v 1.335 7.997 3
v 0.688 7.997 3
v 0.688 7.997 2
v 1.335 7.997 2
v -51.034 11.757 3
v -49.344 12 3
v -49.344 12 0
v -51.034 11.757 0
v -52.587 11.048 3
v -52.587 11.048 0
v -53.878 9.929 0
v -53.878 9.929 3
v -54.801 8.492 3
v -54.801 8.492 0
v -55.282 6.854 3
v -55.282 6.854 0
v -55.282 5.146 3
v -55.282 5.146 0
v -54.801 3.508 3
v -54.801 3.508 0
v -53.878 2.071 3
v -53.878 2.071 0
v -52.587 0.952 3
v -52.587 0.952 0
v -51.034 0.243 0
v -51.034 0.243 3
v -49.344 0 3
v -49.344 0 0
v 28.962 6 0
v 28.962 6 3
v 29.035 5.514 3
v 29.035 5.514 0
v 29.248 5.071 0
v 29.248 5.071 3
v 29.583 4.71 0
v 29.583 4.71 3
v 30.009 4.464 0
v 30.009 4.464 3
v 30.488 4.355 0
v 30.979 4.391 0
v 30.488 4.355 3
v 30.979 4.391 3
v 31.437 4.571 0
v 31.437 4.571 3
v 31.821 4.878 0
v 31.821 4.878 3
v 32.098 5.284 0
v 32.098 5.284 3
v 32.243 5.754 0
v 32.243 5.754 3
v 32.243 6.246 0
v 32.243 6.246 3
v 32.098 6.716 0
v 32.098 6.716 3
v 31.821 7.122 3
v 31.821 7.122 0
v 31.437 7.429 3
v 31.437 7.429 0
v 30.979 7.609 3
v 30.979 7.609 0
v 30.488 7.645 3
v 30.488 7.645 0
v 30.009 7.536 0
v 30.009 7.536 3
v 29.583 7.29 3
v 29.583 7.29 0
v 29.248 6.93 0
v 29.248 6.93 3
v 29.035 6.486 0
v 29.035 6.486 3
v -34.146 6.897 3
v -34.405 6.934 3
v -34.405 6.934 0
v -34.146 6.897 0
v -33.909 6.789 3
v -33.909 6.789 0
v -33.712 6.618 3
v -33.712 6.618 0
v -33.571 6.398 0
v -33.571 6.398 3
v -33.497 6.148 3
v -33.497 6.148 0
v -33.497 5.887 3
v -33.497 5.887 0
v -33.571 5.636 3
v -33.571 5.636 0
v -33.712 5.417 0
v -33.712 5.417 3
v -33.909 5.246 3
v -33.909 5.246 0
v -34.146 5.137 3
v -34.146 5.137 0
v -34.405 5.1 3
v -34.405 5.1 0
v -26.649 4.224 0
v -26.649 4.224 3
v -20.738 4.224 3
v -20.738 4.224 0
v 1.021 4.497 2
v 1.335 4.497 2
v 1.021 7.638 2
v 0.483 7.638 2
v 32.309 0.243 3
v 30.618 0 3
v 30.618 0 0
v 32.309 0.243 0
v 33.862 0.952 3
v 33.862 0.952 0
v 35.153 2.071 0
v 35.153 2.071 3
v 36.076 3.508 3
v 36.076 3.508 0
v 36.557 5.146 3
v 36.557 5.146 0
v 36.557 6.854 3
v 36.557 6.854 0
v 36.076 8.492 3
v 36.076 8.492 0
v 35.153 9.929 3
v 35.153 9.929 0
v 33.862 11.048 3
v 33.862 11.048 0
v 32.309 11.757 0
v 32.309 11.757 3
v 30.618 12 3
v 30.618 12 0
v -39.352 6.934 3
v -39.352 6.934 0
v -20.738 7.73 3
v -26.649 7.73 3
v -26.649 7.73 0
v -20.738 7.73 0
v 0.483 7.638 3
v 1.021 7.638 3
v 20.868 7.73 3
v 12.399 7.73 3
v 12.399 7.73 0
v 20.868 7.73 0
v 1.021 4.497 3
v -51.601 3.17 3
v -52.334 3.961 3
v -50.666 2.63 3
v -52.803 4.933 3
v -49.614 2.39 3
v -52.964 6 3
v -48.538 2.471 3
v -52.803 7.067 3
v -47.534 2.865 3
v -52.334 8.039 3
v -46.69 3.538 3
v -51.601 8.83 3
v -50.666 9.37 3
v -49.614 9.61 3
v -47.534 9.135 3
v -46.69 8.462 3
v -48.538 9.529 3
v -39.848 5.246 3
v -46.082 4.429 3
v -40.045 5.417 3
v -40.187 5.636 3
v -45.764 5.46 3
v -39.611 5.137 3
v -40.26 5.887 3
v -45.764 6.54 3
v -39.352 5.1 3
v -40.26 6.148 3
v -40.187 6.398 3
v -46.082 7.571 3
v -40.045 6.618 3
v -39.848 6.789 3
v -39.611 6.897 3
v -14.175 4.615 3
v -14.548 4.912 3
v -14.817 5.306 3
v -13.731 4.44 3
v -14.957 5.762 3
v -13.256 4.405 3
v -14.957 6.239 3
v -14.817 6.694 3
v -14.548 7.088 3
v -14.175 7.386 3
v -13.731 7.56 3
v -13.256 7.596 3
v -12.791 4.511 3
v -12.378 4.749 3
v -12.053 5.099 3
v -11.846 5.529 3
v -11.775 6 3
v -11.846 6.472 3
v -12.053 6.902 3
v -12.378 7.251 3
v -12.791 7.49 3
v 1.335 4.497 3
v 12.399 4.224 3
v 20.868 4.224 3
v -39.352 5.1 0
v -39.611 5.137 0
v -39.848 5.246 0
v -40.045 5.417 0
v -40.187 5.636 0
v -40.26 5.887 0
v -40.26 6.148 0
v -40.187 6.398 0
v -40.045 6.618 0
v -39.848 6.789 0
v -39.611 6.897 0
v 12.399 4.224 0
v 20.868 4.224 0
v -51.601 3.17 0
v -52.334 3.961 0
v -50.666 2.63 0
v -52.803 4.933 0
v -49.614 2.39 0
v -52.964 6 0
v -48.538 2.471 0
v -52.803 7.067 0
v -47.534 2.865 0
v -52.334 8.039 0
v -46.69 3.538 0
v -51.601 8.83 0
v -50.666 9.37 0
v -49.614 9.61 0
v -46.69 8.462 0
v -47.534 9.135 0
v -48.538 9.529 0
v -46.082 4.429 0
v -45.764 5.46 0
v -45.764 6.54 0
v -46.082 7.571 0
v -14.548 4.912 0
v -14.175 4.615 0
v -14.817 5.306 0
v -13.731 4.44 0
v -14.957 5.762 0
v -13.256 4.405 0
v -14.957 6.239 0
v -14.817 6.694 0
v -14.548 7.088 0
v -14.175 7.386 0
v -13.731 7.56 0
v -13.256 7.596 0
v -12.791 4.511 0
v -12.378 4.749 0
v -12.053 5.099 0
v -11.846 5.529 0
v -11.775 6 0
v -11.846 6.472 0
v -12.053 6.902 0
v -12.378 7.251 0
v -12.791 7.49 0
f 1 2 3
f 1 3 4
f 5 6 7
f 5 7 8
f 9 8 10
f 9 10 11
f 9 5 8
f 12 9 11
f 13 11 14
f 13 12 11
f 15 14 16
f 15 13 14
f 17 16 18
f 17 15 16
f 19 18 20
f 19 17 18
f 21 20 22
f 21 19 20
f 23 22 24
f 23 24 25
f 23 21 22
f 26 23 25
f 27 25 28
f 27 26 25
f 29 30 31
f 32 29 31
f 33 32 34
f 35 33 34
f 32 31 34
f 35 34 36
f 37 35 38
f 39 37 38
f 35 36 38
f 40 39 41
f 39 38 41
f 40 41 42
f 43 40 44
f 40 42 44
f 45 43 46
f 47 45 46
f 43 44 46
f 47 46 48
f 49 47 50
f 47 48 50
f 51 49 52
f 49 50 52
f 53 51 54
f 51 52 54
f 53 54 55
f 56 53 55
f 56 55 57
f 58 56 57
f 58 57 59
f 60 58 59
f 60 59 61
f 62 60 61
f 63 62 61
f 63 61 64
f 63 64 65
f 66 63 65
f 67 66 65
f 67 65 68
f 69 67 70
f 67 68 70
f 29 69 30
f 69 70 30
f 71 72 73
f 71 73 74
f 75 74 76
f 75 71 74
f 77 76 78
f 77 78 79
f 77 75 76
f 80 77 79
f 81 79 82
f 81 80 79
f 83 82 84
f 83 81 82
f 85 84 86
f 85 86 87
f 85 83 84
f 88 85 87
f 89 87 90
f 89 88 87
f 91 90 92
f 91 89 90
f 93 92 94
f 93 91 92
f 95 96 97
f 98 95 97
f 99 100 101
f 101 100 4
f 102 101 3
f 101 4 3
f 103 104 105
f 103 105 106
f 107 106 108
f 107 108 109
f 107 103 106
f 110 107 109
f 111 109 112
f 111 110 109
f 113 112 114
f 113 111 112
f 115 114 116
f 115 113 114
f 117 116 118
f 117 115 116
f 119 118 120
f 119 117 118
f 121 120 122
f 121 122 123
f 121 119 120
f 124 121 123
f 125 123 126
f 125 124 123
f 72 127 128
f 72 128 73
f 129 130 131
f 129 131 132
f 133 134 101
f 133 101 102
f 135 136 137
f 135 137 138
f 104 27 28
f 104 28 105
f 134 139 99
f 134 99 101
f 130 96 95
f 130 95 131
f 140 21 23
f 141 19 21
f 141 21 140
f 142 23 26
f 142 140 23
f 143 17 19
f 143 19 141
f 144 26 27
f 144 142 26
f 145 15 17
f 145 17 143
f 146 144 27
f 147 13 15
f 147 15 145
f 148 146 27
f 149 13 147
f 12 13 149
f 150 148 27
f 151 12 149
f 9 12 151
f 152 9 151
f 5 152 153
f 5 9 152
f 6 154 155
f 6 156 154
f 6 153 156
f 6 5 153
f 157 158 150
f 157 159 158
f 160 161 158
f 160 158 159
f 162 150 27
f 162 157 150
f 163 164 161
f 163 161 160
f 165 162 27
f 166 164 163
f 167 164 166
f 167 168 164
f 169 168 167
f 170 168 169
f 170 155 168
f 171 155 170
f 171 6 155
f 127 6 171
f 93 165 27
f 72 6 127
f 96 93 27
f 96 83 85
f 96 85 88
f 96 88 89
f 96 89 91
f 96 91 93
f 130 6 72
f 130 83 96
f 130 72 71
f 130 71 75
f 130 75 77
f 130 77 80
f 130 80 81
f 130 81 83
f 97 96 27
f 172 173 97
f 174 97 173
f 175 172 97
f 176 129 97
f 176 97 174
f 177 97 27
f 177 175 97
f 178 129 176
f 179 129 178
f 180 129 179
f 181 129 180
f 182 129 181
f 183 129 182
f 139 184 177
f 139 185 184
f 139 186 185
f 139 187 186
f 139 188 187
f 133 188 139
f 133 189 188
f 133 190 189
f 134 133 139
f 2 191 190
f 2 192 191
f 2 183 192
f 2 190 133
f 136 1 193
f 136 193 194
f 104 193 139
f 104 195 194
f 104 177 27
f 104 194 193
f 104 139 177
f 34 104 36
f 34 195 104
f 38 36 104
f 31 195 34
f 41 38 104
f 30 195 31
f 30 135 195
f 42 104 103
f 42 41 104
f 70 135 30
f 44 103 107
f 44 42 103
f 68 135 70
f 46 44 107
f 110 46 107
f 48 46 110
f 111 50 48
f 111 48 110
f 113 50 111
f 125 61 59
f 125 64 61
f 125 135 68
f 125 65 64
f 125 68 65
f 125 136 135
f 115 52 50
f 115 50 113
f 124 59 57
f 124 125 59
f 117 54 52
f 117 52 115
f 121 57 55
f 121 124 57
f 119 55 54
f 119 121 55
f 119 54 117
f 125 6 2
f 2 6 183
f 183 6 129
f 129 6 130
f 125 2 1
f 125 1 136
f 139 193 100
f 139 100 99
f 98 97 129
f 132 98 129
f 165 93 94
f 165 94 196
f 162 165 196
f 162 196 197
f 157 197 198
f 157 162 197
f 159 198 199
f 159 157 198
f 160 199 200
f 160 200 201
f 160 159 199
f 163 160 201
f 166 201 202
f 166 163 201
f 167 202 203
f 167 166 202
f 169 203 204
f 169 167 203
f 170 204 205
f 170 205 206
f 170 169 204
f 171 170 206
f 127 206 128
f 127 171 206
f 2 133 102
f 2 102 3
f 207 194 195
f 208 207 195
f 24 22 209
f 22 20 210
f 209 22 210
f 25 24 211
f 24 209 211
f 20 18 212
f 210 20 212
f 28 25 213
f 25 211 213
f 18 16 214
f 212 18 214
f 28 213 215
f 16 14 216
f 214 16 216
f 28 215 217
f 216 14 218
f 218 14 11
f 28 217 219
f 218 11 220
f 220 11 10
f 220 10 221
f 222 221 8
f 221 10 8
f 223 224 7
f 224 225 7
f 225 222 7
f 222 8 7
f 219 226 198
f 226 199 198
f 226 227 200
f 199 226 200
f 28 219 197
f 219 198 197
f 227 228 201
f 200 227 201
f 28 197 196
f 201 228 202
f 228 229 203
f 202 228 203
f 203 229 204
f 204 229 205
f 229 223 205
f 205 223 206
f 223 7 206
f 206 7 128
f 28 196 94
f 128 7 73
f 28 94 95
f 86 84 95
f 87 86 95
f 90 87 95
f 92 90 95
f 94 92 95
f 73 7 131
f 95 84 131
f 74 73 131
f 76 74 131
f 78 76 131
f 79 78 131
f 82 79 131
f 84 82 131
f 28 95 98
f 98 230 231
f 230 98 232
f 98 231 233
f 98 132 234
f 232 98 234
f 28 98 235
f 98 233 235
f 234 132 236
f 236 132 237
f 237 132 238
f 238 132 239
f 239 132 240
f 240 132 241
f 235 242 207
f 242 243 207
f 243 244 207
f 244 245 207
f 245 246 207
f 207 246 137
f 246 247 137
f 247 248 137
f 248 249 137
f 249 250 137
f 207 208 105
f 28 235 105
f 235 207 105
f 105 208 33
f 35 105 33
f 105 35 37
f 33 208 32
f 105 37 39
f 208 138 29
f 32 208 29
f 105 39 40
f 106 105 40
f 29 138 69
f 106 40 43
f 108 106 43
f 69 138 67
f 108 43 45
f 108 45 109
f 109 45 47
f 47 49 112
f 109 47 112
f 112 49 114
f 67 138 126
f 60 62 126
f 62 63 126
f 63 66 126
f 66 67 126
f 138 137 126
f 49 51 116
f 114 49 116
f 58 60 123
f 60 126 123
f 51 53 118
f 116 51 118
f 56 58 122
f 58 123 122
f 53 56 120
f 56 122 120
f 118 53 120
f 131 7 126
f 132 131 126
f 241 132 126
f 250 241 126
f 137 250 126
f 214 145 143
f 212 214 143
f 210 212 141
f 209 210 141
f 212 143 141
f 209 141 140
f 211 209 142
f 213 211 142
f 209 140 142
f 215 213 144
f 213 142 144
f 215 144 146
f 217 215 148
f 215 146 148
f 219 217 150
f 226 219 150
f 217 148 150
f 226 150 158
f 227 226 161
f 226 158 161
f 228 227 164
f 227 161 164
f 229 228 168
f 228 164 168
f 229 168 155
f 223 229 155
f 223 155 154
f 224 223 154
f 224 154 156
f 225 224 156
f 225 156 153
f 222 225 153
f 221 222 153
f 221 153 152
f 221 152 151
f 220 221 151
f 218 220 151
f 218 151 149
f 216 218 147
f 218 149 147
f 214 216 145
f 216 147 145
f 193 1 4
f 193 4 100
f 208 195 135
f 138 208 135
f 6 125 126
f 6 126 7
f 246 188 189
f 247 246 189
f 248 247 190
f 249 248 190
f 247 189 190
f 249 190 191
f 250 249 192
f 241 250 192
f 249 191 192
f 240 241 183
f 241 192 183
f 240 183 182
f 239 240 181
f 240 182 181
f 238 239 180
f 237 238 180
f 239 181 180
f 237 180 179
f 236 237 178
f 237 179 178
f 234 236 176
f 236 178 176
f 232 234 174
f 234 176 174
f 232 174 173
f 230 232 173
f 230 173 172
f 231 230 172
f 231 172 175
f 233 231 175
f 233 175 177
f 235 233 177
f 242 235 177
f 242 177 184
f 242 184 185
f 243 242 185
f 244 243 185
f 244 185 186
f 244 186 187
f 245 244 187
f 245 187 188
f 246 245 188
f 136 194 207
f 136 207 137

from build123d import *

# Parameters (mm, degrees)
SKETCH_1_R          = 1.65
SKETCH_1_R_2        = 3.62
SKETCH_1_W          = 5.910456895
SKETCH_1_H          = 3.506249455
SKETCH_1_W_2        = 8.468810135
EXTRUDE_1_DEPTH     = 3
SKETCH_2_R          = 1.6
CUT_EXTRUDE_1_DEPTH = 57.708942736
CUT_EXTRUDE_2_DEPTH = 1


with BuildPart() as part:
    # 草图1 → 凸台-拉伸1 (new body)
    with BuildSketch(Plane.XY.offset(3)):
        with BuildLine():
            Line((30.618171933, 12), (-49.343510787, 12))
            ThreePointArc((-49.343510787, 12), (-55.343510787, 6), (-49.343510787, 0))
            Line((-49.343510787, 0), (30.618171933, 0))
            ThreePointArc((30.618171933, 0), (36.618171933, 6), (30.618171933, 12))
        make_face()
        with Locations(Location((30.611606698, 6.0001, 0), (0, 0, 180))):
            Circle(SKETCH_1_R, mode=Mode.SUBTRACT)
        with Locations(Location((-49.343510787, 6, 0), (0, 0, 180))):
            Circle(SKETCH_1_R_2, mode=Mode.SUBTRACT)
        with Locations((-23.693418044, 5.97708776)):
            Rectangle(SKETCH_1_W, SKETCH_1_H, mode=Mode.SUBTRACT)
        with Locations((16.633615742, 5.97708776)):
            Rectangle(SKETCH_1_W_2, SKETCH_1_H, mode=Mode.SUBTRACT)
        with BuildLine():
            Line((-34.404739086, 5.1001), (-39.352347519, 5.1001))
            ThreePointArc((-39.352347519, 5.1001), (-40.269423986, 6.017176468), (-39.352347519, 6.934252935))
            Line((-39.352347519, 6.934252935), (-34.404739086, 6.934252935))
            ThreePointArc((-34.404739086, 6.934252935), (-33.487662618, 6.017176468), (-34.404739086, 5.1001))
        make_face(mode=Mode.SUBTRACT)
    extrude(amount=-EXTRUDE_1_DEPTH)

    # 草图2 → 切除-拉伸1 (cut, through all)
    with BuildSketch(Plane.XY.offset(3)):
        with Locations((-13.375343302, 6.0002)):
            Circle(SKETCH_2_R)
    extrude(amount=-CUT_EXTRUDE_1_DEPTH, mode=Mode.SUBTRACT)

    # 草图3 → 切除-拉伸2 (cut)
    with BuildSketch(Plane.XY.offset(3)):
        Polygon((0.687961553, 7.996886868), (1.335096969, 7.996886868), (1.335096969, 4.496886868), (1.020994405, 4.496886868), (1.020994405, 7.637912509), (0.482532867, 7.637912509), align=None)
    extrude(amount=-CUT_EXTRUDE_2_DEPTH, mode=Mode.SUBTRACT)


solid = part.part
